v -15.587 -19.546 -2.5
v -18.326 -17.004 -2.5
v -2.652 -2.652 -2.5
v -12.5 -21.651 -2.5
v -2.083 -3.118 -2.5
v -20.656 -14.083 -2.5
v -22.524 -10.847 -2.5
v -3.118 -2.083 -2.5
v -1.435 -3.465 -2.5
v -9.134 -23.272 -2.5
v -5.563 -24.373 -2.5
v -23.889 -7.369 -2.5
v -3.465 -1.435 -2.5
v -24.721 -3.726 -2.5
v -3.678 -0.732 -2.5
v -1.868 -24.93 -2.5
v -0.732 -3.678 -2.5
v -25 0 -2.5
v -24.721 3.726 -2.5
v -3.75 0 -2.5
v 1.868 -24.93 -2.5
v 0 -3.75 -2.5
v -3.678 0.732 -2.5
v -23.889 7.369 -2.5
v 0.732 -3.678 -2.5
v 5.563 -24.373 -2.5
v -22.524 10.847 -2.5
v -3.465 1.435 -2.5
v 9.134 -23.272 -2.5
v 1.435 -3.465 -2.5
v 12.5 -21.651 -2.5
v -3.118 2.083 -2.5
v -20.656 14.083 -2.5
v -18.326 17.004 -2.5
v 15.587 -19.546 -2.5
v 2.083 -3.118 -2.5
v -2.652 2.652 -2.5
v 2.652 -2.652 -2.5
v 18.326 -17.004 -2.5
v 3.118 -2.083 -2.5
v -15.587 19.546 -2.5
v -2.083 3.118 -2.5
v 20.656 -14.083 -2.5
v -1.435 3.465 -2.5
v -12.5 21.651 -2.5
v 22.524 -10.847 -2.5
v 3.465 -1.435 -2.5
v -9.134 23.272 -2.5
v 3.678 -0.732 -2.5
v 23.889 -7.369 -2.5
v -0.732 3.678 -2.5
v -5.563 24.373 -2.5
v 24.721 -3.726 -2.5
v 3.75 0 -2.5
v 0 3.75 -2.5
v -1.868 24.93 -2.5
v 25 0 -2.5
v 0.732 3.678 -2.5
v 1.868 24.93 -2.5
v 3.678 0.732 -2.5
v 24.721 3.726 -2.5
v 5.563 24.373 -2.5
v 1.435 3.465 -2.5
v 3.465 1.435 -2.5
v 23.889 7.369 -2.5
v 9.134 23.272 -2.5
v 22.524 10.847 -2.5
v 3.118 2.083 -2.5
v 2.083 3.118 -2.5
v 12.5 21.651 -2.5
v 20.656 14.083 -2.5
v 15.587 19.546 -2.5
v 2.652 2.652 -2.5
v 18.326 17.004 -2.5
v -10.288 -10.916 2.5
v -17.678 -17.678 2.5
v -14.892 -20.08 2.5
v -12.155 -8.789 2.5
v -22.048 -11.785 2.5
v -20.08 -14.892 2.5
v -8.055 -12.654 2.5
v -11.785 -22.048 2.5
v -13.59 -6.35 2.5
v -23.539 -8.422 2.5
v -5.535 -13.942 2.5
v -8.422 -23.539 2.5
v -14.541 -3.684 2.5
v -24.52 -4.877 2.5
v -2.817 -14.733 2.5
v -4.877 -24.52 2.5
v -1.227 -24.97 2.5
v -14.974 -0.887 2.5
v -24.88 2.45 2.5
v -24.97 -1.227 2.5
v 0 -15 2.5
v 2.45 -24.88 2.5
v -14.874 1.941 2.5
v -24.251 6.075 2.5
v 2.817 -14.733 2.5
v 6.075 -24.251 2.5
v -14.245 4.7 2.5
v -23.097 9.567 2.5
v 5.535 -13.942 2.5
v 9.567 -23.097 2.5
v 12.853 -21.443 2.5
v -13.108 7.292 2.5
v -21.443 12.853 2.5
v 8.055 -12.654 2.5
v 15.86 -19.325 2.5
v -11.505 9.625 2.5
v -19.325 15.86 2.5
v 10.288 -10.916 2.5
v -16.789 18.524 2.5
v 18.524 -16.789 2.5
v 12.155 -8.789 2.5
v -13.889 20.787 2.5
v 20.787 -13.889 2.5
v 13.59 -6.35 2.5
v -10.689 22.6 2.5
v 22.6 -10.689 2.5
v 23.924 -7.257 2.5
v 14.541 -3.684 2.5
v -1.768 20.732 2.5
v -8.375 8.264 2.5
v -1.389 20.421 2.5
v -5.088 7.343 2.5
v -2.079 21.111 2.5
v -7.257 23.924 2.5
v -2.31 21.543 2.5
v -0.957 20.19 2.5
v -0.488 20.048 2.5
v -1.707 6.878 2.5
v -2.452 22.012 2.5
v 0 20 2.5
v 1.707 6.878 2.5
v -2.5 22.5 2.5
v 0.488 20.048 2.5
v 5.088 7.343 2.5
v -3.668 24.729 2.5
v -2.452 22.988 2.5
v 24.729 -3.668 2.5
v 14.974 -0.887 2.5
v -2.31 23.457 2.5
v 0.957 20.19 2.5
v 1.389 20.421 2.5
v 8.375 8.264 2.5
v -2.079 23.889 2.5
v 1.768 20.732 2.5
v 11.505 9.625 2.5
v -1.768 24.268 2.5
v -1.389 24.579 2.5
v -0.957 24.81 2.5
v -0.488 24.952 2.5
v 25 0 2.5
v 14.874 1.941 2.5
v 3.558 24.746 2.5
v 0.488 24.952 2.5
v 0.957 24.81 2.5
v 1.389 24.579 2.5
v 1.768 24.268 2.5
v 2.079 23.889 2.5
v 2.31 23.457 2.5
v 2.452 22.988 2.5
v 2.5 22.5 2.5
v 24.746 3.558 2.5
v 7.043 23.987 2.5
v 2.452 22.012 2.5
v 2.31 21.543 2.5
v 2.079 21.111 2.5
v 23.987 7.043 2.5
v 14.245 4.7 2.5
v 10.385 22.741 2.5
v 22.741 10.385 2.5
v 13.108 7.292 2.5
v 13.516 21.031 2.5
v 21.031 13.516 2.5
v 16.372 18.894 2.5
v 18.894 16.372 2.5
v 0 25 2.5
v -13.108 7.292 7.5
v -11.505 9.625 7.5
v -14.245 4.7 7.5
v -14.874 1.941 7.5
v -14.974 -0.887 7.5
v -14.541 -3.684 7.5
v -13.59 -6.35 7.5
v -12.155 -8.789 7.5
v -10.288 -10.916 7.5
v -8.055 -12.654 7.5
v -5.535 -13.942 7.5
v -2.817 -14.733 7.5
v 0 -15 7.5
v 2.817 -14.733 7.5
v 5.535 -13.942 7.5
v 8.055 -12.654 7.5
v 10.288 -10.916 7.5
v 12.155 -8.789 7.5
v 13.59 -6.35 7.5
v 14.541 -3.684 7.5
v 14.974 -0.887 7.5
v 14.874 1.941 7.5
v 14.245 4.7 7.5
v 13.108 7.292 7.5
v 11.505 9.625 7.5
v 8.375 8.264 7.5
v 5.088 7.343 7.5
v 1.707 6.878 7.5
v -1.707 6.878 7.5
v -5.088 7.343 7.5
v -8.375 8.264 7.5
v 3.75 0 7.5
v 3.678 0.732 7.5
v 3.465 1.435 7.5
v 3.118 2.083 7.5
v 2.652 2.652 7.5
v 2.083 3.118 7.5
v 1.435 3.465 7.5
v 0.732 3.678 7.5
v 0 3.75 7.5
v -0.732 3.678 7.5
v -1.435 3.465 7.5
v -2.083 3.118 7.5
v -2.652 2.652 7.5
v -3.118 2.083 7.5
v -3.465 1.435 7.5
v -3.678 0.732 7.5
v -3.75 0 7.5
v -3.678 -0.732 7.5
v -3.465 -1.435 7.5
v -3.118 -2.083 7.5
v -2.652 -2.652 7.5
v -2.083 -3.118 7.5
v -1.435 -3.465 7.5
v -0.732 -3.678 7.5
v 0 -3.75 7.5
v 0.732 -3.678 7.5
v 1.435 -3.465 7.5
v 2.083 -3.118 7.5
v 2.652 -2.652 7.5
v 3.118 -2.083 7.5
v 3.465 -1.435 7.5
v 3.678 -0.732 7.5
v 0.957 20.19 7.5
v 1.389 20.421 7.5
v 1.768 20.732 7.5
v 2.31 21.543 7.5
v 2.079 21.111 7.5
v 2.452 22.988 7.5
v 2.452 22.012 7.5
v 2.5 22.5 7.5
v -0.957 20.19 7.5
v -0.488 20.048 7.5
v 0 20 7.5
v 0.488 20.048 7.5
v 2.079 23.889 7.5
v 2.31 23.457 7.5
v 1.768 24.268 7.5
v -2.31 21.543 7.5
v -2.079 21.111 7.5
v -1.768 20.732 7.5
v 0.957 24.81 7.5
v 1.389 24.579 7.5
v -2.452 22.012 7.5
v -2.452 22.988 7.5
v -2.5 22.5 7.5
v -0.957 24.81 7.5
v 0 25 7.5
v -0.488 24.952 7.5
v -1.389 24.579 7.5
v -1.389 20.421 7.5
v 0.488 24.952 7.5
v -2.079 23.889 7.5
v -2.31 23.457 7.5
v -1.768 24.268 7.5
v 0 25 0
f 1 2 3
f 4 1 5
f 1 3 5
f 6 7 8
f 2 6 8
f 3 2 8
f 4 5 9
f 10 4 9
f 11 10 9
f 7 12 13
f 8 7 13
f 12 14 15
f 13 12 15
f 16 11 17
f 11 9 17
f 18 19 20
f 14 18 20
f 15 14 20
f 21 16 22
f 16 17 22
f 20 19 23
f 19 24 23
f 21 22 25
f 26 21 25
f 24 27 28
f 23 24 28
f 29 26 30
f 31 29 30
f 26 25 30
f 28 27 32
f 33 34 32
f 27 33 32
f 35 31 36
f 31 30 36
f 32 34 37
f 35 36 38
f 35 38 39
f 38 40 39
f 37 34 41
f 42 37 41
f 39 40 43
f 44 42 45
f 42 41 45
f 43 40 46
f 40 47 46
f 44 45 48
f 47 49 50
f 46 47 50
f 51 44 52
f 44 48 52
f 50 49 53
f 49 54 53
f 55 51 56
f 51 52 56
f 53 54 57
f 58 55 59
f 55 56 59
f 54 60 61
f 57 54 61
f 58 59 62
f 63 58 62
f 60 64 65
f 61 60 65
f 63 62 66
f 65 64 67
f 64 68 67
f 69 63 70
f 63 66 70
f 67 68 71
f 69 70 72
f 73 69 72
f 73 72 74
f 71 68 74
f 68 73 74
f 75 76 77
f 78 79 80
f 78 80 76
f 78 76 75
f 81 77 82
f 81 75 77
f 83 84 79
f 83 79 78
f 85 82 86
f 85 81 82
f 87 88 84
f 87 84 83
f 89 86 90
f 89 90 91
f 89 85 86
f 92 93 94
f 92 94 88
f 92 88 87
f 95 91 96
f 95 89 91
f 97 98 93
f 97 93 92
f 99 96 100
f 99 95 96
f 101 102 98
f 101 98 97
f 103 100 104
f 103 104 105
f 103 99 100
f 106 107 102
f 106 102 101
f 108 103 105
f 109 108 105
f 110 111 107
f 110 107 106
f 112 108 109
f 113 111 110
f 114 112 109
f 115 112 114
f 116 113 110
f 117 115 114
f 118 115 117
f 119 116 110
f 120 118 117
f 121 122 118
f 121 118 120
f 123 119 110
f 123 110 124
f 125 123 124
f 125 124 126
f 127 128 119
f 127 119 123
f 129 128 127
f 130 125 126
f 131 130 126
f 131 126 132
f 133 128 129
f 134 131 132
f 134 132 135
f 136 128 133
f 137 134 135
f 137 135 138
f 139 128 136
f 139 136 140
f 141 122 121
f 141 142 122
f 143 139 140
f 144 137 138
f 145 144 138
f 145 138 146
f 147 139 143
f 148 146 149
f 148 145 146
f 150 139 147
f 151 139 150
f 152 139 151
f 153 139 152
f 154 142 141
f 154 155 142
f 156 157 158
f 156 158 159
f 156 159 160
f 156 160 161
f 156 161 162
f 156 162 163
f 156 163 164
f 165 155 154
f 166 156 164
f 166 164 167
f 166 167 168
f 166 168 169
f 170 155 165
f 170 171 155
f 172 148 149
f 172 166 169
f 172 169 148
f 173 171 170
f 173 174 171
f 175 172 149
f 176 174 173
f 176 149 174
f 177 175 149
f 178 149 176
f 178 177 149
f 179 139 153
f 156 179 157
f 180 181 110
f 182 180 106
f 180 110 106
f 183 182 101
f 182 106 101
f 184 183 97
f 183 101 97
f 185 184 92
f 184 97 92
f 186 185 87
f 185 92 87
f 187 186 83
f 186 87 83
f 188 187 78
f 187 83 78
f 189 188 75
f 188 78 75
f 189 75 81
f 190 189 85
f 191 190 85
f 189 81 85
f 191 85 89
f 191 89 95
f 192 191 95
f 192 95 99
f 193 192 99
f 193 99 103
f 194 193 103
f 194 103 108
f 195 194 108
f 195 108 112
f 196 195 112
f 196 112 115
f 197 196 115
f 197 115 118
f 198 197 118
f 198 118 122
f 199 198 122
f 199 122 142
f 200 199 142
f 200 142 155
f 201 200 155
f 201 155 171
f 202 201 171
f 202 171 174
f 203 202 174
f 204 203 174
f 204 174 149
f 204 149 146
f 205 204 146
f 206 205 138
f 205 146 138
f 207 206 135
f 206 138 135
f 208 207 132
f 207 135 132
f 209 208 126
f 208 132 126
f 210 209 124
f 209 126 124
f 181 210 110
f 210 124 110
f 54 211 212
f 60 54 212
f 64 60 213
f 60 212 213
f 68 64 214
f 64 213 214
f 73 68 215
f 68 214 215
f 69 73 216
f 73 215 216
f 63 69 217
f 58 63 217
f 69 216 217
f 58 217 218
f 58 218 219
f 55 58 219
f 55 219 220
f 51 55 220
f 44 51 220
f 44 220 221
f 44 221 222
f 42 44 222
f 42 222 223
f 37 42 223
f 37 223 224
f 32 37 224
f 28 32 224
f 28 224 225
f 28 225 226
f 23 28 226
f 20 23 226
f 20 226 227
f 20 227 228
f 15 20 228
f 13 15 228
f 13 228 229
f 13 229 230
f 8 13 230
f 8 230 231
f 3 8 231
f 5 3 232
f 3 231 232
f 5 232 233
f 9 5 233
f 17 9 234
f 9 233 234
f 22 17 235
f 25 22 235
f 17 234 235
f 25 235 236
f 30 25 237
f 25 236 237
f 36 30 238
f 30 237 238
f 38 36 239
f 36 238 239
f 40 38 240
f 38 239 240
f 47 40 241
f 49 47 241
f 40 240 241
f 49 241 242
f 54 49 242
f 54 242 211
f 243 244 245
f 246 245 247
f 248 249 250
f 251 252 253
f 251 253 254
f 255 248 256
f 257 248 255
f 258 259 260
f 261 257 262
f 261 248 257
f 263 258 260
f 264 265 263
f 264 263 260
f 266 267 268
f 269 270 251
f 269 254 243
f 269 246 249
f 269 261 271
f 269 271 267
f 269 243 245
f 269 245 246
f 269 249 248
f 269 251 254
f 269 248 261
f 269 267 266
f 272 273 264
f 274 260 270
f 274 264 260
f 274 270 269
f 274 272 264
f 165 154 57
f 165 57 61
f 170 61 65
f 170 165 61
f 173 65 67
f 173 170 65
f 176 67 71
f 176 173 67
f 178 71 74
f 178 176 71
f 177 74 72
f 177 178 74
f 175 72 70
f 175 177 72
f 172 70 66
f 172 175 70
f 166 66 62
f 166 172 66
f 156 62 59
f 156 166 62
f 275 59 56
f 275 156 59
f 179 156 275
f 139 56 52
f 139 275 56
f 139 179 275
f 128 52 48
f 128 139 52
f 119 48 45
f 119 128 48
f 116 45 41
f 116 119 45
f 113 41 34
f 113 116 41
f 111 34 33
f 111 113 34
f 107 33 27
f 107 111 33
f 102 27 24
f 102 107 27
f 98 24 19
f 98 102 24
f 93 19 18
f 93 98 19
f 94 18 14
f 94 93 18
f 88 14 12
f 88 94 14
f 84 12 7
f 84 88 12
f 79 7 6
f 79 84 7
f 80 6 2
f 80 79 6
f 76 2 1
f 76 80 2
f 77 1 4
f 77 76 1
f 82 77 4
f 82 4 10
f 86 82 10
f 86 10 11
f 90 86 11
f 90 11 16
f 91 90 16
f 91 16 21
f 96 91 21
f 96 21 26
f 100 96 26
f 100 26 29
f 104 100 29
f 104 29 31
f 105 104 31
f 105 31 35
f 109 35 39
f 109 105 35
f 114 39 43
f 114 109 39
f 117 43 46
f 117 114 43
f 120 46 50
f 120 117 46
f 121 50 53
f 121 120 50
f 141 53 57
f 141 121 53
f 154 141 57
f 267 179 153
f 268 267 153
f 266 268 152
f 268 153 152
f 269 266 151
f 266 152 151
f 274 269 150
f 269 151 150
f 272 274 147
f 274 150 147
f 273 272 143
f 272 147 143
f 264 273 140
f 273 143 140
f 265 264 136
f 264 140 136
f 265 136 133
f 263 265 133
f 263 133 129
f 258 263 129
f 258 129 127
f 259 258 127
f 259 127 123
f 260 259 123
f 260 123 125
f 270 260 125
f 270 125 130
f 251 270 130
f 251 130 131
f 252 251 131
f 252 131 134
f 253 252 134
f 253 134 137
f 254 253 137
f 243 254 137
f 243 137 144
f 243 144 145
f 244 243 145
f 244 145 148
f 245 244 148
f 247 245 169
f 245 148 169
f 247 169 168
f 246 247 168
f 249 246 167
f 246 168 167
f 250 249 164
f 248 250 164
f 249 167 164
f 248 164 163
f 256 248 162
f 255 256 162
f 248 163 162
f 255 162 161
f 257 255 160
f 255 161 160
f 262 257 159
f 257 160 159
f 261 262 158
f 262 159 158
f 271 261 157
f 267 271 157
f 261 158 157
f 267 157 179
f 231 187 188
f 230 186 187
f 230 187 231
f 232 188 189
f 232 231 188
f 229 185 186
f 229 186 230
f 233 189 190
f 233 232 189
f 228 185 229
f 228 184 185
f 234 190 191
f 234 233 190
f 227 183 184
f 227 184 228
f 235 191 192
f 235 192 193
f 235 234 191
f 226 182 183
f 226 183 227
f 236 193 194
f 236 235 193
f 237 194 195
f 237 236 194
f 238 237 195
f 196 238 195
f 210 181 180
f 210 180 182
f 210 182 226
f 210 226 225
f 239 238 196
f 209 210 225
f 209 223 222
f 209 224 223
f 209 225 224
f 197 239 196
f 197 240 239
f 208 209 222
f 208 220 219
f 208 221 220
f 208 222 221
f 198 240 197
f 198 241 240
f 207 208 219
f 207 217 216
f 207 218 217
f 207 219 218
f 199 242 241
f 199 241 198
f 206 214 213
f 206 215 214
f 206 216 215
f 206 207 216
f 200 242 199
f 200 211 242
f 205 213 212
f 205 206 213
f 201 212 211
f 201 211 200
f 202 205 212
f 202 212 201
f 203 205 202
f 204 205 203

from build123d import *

# Parameters (mm, degrees)
SKETCH1_R           = 25
BOSS_EXTRUDE1_DEPTH = 2.5
SKETCH3_R           = 2.5
BOSS_EXTRUDE3_DEPTH = 7.5
SKETCH5_R           = 3.75
CUT_EXTRUDE1_DEPTH  = 37.742346142


with BuildPart() as part:
    # Sketch1 → Boss-Extrude1 (new, symmetric)
    with BuildSketch(Plane.XY):
        Circle(SKETCH1_R)
    extrude(amount=BOSS_EXTRUDE1_DEPTH, both=True)

    # Sketch3 → Boss-Extrude3 (add)
    with BuildSketch(Plane.XY):
        with Locations(Location((0, 22.5, 0), (0, 0, 90))):
            Circle(SKETCH3_R)
        with BuildLine():
            ThreePointArc((-11.505168712, 9.624504813), (0, -15), (11.505168712, 9.624504813))
            ThreePointArc((11.505168712, 9.624504813), (0, 6.8197992), (-11.505168712, 9.624504813))
        make_face()
    extrude(amount=BOSS_EXTRUDE3_DEPTH)

    # Sketch5 → Cut-Extrude1 (cut, through all)
    with BuildSketch(Plane.XY.offset(7.5)):
        Circle(SKETCH5_R)
    extrude(amount=-CUT_EXTRUDE1_DEPTH, mode=Mode.SUBTRACT)


solid = part.part
